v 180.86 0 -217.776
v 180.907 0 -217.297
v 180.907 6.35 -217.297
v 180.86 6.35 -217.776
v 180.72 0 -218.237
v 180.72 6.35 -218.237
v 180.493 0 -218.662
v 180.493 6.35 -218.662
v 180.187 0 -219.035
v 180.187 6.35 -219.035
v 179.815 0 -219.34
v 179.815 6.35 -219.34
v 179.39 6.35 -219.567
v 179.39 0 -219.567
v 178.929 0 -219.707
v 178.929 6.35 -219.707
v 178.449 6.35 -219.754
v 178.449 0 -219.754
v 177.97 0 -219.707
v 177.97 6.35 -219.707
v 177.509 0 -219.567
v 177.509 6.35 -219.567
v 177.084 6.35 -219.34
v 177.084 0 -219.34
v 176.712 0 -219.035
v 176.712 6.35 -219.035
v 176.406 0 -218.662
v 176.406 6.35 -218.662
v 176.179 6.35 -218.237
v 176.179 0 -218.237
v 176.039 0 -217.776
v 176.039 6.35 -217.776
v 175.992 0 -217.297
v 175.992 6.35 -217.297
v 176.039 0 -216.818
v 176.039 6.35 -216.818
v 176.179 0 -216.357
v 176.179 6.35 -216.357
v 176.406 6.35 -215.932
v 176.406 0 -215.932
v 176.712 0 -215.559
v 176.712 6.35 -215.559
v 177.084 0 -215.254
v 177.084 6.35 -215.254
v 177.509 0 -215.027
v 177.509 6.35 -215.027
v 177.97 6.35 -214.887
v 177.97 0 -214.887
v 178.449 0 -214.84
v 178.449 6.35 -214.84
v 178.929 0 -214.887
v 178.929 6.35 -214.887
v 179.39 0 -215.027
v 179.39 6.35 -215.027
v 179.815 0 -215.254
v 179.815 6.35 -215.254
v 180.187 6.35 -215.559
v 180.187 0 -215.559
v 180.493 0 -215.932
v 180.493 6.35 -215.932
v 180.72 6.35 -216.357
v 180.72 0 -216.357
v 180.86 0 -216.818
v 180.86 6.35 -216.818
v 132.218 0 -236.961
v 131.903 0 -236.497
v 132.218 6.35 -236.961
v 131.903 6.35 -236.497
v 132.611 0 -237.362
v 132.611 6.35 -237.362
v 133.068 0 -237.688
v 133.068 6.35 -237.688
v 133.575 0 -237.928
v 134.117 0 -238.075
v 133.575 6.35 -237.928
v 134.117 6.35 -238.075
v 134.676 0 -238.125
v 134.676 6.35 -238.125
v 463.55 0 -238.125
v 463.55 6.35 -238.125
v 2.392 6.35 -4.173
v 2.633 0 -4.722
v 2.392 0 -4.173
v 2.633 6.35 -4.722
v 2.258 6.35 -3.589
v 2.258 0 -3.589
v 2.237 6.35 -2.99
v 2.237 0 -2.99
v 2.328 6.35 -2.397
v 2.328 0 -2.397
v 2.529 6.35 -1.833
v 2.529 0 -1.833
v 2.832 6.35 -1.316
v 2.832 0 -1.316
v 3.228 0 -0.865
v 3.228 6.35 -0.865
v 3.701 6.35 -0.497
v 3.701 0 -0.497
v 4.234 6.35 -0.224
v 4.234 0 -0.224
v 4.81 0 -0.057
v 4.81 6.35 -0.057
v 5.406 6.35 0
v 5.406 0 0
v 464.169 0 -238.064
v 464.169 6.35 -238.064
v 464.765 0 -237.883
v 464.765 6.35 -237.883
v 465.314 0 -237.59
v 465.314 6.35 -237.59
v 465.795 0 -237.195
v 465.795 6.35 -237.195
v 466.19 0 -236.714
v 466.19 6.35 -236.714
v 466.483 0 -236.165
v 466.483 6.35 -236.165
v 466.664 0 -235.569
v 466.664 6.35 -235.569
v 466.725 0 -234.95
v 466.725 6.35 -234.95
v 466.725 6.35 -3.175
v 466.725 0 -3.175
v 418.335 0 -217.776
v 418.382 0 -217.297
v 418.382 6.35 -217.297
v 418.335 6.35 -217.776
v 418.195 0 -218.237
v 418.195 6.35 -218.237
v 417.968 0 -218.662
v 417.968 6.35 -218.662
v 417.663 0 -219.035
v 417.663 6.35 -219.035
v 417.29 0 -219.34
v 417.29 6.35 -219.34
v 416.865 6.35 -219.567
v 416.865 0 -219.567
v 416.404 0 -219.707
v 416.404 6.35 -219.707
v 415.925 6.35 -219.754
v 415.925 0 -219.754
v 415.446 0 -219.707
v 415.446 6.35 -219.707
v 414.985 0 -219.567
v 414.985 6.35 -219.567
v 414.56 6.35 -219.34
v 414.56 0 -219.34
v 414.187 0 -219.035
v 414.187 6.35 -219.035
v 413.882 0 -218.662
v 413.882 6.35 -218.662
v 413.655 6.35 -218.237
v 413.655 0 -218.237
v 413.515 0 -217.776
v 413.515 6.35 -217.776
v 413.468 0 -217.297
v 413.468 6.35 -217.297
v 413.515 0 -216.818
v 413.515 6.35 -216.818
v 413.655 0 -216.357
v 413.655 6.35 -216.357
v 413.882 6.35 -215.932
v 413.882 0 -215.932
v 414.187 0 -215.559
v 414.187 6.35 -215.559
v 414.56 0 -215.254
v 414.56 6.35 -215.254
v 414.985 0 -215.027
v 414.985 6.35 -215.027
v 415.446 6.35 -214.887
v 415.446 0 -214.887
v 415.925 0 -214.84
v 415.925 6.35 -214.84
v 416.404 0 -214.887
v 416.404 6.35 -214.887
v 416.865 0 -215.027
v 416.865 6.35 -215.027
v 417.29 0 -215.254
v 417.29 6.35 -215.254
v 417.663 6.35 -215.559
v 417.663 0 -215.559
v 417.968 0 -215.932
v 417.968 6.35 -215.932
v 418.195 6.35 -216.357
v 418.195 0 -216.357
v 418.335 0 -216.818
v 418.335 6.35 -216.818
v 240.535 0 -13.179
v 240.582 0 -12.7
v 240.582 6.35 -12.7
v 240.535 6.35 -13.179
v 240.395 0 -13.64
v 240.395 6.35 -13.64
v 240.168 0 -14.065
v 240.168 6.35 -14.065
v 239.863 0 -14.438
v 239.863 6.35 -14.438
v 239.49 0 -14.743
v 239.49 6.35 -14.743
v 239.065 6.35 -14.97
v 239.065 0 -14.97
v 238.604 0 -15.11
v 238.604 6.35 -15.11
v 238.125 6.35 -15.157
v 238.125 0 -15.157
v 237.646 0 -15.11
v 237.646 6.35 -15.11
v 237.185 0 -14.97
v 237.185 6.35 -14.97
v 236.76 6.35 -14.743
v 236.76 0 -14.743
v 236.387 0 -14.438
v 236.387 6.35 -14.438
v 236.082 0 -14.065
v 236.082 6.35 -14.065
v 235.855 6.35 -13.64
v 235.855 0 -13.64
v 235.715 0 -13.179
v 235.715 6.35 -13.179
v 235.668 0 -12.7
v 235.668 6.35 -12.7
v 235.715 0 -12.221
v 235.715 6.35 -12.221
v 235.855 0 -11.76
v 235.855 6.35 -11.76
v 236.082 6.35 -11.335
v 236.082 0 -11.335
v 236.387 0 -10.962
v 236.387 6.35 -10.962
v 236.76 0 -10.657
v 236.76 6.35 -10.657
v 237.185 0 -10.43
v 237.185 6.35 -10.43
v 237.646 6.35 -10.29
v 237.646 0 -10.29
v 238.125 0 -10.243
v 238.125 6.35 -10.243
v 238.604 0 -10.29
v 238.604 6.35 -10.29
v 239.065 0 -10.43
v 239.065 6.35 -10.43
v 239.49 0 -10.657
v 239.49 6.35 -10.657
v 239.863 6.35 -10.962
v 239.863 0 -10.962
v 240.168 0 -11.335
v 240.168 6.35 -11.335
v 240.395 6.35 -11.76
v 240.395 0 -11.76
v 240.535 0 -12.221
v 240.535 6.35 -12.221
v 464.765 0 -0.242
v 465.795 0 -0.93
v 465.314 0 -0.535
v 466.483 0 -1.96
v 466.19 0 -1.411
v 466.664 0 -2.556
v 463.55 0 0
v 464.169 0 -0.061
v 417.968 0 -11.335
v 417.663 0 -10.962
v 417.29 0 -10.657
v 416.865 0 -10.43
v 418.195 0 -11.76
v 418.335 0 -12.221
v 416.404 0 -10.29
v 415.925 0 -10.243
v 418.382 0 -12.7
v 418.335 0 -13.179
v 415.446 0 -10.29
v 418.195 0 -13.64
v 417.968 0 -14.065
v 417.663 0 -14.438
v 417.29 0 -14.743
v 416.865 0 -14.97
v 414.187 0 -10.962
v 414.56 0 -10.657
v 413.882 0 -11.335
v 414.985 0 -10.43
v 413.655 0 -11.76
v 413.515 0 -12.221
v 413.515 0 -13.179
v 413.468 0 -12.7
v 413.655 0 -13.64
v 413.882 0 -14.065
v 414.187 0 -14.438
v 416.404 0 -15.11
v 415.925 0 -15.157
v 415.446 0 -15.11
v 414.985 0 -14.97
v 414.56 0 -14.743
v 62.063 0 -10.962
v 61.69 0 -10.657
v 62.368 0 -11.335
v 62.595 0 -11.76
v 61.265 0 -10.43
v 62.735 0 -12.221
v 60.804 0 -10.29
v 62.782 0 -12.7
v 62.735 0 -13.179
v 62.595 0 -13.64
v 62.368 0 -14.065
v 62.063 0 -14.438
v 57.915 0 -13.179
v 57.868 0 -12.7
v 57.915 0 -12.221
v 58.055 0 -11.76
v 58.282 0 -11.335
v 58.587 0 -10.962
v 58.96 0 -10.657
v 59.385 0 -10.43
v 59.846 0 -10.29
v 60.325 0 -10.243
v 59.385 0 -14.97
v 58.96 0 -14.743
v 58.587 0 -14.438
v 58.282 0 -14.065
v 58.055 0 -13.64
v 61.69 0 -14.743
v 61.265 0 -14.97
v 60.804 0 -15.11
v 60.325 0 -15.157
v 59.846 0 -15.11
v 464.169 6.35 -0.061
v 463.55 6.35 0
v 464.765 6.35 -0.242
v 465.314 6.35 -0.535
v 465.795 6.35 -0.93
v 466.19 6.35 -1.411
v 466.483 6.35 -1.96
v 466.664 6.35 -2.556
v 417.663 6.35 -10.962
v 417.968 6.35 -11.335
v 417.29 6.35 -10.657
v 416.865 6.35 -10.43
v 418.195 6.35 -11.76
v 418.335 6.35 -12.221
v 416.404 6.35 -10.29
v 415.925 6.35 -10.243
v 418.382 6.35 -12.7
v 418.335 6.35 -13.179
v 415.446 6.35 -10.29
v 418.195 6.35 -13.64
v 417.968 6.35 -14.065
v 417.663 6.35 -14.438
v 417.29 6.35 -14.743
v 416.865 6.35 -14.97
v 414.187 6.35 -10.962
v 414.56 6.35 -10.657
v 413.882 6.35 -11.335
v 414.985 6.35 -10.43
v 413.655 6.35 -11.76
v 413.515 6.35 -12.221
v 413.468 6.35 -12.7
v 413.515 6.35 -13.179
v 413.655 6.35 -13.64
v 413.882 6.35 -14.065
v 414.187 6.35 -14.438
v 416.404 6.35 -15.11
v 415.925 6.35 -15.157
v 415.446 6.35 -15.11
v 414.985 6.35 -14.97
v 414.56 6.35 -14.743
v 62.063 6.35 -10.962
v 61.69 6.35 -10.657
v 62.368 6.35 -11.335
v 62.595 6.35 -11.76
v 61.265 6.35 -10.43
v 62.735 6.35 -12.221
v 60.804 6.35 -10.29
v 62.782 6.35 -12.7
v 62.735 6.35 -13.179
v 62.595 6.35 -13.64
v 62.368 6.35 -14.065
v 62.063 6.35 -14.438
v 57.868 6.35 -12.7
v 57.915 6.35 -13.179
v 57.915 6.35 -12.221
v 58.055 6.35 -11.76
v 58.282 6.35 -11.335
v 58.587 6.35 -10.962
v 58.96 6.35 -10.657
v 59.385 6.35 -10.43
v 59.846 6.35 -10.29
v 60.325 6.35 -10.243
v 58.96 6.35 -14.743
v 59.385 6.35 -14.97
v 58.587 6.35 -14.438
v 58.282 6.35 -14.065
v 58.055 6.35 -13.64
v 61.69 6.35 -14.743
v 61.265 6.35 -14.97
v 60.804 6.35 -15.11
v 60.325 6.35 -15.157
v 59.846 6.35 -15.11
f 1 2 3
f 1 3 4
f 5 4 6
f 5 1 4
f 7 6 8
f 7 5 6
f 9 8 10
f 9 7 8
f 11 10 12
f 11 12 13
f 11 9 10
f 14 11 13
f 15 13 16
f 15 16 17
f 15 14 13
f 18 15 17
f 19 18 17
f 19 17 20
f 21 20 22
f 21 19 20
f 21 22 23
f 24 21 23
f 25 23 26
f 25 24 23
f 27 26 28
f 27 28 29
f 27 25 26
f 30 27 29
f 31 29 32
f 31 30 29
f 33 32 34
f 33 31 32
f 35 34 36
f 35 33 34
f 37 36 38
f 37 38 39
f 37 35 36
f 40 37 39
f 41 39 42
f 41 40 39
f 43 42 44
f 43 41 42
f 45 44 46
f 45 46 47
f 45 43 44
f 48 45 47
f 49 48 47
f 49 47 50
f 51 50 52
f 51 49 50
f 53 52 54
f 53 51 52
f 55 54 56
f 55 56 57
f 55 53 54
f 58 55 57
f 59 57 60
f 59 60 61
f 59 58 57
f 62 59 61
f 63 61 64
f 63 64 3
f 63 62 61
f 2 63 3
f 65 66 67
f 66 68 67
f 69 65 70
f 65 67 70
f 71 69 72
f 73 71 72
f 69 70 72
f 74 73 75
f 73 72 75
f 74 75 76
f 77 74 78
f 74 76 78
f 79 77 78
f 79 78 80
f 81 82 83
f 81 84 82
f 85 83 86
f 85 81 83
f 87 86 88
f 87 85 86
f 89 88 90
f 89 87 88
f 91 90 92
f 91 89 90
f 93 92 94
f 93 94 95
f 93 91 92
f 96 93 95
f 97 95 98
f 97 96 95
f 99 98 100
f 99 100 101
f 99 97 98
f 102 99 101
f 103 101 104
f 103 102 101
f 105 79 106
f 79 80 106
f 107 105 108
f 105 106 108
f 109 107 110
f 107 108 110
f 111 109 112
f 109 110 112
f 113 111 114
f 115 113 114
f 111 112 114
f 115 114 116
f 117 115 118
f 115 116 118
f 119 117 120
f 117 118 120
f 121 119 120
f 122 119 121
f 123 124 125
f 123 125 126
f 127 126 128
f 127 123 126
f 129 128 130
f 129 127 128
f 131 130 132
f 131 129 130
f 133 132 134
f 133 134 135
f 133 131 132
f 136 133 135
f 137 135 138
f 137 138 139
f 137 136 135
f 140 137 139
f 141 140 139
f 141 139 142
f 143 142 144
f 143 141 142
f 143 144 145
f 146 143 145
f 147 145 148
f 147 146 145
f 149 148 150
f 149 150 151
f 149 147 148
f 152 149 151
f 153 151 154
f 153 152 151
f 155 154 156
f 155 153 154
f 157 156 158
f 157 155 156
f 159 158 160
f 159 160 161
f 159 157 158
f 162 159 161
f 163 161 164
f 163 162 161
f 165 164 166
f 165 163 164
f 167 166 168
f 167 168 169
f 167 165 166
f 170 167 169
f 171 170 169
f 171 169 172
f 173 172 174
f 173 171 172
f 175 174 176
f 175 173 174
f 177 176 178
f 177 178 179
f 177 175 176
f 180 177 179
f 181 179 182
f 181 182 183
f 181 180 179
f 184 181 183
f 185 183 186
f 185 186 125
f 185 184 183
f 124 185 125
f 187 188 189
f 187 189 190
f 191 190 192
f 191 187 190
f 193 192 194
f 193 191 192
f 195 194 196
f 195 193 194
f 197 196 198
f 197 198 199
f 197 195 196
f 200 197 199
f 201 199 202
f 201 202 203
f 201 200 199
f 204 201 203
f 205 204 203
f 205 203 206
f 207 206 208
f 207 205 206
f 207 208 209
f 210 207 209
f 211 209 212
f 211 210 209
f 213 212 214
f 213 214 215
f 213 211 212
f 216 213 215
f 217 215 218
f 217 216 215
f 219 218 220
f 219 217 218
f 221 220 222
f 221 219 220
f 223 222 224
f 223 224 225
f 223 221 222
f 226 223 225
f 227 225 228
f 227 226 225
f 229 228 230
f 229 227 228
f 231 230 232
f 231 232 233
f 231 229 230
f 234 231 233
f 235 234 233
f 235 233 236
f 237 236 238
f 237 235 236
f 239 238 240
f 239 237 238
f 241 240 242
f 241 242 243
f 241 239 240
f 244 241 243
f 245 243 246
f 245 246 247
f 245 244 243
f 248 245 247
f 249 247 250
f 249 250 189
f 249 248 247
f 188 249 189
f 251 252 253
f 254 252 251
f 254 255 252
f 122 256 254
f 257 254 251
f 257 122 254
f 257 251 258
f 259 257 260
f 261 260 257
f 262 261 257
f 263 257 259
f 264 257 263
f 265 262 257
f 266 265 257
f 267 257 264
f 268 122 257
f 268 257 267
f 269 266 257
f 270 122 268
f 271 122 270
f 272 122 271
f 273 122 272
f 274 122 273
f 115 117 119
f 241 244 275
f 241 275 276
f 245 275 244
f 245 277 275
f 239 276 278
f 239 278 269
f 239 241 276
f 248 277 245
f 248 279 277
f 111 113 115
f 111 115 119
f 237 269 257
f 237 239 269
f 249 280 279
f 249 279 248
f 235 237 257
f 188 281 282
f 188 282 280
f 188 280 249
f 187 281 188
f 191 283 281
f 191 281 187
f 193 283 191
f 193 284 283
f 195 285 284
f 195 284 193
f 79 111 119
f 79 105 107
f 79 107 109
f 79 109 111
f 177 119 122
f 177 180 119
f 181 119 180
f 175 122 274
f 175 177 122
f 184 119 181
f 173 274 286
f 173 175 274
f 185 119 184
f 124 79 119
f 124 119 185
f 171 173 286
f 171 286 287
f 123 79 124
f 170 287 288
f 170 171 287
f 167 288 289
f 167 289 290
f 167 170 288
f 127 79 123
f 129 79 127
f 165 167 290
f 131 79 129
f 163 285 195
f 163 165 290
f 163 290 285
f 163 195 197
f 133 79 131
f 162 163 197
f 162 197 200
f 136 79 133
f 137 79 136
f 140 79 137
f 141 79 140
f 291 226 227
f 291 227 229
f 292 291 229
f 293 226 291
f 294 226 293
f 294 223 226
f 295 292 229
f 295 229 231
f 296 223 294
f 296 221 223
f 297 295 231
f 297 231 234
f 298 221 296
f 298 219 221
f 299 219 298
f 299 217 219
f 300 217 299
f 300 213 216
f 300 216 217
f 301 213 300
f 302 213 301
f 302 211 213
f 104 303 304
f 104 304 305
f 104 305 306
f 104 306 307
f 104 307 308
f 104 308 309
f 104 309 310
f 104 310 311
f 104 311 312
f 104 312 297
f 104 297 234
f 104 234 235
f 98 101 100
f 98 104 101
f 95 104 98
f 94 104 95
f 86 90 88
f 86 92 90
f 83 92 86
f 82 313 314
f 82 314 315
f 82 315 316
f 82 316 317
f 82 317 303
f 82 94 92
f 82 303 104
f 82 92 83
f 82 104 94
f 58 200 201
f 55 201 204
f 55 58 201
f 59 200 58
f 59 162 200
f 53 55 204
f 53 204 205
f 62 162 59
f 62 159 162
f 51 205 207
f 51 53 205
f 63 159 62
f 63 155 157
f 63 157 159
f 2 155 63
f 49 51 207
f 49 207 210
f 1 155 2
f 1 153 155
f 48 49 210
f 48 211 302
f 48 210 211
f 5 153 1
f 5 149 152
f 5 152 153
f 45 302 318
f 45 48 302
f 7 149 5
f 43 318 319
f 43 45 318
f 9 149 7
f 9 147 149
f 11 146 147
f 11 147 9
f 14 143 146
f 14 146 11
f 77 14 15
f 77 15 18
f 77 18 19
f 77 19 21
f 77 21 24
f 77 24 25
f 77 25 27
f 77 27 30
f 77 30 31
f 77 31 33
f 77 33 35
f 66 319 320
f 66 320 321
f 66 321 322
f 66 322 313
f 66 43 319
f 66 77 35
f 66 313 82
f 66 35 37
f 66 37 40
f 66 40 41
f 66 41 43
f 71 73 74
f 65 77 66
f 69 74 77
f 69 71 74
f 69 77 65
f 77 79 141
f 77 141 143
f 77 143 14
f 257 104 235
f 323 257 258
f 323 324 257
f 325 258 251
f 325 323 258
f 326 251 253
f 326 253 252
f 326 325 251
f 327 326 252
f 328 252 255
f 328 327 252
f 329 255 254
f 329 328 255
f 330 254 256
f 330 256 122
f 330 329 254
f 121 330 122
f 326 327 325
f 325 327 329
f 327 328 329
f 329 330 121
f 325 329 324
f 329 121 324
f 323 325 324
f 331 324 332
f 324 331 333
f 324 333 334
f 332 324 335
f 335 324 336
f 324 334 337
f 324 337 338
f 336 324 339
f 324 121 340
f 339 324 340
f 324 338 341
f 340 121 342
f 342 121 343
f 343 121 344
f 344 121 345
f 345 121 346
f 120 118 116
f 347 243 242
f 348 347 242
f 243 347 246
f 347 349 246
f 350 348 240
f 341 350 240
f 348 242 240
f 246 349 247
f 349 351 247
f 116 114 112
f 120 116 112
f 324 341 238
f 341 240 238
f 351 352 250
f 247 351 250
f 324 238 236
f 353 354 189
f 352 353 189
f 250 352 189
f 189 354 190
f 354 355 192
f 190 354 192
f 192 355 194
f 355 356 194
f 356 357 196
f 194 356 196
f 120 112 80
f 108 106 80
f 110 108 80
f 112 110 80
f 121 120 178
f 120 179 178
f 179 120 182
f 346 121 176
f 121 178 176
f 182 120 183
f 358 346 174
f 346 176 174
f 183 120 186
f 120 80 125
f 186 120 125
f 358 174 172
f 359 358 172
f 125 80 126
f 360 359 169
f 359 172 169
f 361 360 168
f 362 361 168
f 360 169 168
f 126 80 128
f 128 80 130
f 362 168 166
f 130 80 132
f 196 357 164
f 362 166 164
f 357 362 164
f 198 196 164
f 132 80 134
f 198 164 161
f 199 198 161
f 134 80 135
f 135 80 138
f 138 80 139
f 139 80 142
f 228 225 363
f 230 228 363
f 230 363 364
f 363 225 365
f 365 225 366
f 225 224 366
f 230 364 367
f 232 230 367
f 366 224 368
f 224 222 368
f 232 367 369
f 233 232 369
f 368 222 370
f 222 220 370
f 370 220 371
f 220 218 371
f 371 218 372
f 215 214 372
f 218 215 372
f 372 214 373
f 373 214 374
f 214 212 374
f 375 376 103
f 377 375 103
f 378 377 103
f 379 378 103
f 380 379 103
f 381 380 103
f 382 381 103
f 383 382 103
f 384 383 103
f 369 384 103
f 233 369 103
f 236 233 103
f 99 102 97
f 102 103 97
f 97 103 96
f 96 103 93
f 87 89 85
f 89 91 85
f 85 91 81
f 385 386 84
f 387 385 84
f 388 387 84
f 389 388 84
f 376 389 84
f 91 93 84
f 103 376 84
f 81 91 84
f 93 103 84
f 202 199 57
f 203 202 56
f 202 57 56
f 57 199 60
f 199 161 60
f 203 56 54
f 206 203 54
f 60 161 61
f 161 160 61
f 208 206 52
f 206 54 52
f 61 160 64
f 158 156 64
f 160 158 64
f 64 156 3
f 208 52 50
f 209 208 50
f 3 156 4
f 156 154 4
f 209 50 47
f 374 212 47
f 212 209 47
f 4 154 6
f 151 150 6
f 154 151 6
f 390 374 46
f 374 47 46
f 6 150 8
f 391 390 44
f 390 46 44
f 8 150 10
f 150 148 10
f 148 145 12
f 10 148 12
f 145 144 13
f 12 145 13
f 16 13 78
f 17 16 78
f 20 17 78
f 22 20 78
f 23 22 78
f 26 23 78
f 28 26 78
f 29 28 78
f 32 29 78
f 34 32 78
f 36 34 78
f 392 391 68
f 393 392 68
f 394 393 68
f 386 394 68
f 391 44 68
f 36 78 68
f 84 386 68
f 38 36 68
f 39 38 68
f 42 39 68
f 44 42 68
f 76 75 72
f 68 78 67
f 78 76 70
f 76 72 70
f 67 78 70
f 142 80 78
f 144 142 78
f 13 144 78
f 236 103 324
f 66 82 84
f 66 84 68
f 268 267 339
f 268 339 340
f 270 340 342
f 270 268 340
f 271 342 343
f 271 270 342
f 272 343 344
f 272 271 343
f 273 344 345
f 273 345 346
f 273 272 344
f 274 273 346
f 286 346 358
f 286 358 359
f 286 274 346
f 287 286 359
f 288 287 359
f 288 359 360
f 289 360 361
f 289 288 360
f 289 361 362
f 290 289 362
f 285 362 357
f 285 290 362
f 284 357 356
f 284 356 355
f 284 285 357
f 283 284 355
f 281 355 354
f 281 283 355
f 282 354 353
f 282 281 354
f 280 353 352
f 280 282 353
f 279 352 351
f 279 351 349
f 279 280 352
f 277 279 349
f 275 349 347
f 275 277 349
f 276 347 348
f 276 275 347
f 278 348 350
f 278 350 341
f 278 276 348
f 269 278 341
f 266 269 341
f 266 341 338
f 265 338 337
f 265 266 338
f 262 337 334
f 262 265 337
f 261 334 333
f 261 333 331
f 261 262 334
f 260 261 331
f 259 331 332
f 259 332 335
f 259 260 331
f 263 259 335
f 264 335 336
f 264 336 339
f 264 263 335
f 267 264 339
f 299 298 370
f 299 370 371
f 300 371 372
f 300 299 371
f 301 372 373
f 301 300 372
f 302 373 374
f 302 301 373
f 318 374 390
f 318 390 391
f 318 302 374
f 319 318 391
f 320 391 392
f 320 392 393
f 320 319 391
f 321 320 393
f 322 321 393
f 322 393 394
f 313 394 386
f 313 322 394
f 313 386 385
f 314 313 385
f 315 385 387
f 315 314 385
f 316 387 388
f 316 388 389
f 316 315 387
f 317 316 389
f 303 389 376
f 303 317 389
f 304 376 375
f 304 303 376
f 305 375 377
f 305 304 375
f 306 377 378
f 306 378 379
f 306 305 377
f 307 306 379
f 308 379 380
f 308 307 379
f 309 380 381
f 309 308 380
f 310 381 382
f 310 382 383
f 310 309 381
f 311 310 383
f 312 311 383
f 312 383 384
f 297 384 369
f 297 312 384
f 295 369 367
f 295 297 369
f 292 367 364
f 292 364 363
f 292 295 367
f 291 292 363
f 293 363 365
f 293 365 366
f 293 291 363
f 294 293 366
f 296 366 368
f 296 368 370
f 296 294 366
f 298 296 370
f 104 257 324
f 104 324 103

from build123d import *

# Parameters (mm, degrees)
SKETCH1_R           = 2.45745
BOSS_EXTRUDE1_DEPTH = 6.35
FILLET1_R           = 3.175


with BuildPart() as part:
    # Sketch1 → Boss-Extrude1 (new body)
    with BuildSketch(Plane(origin=(0, 0, 0), x_dir=(1, 0, 0), z_dir=(0, 1, 0))):
        Polygon((0, 0), (132.810986877, 238.125), (466.725, 238.125), (466.725, 0), align=None)
        with Locations((415.925, 217.297)):
            Circle(SKETCH1_R, mode=Mode.SUBTRACT)
        with Locations((415.925, 12.7)):
            Circle(SKETCH1_R, mode=Mode.SUBTRACT)
        with Locations((238.125, 12.7)):
            Circle(SKETCH1_R, mode=Mode.SUBTRACT)
        with Locations((60.325, 12.7)):
            Circle(SKETCH1_R, mode=Mode.SUBTRACT)
        with Locations((178.449400022, 217.297)):
            Circle(SKETCH1_R, mode=Mode.SUBTRACT)
    extrude(amount=BOSS_EXTRUDE1_DEPTH)

    # Fillet1
    fillet1_edges = [part.edges().sort_by_distance(p)[0] for p in [
        (0, 3.175, 0),
        (132.810986877, 3.175, -238.125),
        (466.725, 3.175, -238.125),
        (466.725, 3.175, 0),
    ]]
    fillet(fillet1_edges, radius=FILLET1_R)


solid = part.part
